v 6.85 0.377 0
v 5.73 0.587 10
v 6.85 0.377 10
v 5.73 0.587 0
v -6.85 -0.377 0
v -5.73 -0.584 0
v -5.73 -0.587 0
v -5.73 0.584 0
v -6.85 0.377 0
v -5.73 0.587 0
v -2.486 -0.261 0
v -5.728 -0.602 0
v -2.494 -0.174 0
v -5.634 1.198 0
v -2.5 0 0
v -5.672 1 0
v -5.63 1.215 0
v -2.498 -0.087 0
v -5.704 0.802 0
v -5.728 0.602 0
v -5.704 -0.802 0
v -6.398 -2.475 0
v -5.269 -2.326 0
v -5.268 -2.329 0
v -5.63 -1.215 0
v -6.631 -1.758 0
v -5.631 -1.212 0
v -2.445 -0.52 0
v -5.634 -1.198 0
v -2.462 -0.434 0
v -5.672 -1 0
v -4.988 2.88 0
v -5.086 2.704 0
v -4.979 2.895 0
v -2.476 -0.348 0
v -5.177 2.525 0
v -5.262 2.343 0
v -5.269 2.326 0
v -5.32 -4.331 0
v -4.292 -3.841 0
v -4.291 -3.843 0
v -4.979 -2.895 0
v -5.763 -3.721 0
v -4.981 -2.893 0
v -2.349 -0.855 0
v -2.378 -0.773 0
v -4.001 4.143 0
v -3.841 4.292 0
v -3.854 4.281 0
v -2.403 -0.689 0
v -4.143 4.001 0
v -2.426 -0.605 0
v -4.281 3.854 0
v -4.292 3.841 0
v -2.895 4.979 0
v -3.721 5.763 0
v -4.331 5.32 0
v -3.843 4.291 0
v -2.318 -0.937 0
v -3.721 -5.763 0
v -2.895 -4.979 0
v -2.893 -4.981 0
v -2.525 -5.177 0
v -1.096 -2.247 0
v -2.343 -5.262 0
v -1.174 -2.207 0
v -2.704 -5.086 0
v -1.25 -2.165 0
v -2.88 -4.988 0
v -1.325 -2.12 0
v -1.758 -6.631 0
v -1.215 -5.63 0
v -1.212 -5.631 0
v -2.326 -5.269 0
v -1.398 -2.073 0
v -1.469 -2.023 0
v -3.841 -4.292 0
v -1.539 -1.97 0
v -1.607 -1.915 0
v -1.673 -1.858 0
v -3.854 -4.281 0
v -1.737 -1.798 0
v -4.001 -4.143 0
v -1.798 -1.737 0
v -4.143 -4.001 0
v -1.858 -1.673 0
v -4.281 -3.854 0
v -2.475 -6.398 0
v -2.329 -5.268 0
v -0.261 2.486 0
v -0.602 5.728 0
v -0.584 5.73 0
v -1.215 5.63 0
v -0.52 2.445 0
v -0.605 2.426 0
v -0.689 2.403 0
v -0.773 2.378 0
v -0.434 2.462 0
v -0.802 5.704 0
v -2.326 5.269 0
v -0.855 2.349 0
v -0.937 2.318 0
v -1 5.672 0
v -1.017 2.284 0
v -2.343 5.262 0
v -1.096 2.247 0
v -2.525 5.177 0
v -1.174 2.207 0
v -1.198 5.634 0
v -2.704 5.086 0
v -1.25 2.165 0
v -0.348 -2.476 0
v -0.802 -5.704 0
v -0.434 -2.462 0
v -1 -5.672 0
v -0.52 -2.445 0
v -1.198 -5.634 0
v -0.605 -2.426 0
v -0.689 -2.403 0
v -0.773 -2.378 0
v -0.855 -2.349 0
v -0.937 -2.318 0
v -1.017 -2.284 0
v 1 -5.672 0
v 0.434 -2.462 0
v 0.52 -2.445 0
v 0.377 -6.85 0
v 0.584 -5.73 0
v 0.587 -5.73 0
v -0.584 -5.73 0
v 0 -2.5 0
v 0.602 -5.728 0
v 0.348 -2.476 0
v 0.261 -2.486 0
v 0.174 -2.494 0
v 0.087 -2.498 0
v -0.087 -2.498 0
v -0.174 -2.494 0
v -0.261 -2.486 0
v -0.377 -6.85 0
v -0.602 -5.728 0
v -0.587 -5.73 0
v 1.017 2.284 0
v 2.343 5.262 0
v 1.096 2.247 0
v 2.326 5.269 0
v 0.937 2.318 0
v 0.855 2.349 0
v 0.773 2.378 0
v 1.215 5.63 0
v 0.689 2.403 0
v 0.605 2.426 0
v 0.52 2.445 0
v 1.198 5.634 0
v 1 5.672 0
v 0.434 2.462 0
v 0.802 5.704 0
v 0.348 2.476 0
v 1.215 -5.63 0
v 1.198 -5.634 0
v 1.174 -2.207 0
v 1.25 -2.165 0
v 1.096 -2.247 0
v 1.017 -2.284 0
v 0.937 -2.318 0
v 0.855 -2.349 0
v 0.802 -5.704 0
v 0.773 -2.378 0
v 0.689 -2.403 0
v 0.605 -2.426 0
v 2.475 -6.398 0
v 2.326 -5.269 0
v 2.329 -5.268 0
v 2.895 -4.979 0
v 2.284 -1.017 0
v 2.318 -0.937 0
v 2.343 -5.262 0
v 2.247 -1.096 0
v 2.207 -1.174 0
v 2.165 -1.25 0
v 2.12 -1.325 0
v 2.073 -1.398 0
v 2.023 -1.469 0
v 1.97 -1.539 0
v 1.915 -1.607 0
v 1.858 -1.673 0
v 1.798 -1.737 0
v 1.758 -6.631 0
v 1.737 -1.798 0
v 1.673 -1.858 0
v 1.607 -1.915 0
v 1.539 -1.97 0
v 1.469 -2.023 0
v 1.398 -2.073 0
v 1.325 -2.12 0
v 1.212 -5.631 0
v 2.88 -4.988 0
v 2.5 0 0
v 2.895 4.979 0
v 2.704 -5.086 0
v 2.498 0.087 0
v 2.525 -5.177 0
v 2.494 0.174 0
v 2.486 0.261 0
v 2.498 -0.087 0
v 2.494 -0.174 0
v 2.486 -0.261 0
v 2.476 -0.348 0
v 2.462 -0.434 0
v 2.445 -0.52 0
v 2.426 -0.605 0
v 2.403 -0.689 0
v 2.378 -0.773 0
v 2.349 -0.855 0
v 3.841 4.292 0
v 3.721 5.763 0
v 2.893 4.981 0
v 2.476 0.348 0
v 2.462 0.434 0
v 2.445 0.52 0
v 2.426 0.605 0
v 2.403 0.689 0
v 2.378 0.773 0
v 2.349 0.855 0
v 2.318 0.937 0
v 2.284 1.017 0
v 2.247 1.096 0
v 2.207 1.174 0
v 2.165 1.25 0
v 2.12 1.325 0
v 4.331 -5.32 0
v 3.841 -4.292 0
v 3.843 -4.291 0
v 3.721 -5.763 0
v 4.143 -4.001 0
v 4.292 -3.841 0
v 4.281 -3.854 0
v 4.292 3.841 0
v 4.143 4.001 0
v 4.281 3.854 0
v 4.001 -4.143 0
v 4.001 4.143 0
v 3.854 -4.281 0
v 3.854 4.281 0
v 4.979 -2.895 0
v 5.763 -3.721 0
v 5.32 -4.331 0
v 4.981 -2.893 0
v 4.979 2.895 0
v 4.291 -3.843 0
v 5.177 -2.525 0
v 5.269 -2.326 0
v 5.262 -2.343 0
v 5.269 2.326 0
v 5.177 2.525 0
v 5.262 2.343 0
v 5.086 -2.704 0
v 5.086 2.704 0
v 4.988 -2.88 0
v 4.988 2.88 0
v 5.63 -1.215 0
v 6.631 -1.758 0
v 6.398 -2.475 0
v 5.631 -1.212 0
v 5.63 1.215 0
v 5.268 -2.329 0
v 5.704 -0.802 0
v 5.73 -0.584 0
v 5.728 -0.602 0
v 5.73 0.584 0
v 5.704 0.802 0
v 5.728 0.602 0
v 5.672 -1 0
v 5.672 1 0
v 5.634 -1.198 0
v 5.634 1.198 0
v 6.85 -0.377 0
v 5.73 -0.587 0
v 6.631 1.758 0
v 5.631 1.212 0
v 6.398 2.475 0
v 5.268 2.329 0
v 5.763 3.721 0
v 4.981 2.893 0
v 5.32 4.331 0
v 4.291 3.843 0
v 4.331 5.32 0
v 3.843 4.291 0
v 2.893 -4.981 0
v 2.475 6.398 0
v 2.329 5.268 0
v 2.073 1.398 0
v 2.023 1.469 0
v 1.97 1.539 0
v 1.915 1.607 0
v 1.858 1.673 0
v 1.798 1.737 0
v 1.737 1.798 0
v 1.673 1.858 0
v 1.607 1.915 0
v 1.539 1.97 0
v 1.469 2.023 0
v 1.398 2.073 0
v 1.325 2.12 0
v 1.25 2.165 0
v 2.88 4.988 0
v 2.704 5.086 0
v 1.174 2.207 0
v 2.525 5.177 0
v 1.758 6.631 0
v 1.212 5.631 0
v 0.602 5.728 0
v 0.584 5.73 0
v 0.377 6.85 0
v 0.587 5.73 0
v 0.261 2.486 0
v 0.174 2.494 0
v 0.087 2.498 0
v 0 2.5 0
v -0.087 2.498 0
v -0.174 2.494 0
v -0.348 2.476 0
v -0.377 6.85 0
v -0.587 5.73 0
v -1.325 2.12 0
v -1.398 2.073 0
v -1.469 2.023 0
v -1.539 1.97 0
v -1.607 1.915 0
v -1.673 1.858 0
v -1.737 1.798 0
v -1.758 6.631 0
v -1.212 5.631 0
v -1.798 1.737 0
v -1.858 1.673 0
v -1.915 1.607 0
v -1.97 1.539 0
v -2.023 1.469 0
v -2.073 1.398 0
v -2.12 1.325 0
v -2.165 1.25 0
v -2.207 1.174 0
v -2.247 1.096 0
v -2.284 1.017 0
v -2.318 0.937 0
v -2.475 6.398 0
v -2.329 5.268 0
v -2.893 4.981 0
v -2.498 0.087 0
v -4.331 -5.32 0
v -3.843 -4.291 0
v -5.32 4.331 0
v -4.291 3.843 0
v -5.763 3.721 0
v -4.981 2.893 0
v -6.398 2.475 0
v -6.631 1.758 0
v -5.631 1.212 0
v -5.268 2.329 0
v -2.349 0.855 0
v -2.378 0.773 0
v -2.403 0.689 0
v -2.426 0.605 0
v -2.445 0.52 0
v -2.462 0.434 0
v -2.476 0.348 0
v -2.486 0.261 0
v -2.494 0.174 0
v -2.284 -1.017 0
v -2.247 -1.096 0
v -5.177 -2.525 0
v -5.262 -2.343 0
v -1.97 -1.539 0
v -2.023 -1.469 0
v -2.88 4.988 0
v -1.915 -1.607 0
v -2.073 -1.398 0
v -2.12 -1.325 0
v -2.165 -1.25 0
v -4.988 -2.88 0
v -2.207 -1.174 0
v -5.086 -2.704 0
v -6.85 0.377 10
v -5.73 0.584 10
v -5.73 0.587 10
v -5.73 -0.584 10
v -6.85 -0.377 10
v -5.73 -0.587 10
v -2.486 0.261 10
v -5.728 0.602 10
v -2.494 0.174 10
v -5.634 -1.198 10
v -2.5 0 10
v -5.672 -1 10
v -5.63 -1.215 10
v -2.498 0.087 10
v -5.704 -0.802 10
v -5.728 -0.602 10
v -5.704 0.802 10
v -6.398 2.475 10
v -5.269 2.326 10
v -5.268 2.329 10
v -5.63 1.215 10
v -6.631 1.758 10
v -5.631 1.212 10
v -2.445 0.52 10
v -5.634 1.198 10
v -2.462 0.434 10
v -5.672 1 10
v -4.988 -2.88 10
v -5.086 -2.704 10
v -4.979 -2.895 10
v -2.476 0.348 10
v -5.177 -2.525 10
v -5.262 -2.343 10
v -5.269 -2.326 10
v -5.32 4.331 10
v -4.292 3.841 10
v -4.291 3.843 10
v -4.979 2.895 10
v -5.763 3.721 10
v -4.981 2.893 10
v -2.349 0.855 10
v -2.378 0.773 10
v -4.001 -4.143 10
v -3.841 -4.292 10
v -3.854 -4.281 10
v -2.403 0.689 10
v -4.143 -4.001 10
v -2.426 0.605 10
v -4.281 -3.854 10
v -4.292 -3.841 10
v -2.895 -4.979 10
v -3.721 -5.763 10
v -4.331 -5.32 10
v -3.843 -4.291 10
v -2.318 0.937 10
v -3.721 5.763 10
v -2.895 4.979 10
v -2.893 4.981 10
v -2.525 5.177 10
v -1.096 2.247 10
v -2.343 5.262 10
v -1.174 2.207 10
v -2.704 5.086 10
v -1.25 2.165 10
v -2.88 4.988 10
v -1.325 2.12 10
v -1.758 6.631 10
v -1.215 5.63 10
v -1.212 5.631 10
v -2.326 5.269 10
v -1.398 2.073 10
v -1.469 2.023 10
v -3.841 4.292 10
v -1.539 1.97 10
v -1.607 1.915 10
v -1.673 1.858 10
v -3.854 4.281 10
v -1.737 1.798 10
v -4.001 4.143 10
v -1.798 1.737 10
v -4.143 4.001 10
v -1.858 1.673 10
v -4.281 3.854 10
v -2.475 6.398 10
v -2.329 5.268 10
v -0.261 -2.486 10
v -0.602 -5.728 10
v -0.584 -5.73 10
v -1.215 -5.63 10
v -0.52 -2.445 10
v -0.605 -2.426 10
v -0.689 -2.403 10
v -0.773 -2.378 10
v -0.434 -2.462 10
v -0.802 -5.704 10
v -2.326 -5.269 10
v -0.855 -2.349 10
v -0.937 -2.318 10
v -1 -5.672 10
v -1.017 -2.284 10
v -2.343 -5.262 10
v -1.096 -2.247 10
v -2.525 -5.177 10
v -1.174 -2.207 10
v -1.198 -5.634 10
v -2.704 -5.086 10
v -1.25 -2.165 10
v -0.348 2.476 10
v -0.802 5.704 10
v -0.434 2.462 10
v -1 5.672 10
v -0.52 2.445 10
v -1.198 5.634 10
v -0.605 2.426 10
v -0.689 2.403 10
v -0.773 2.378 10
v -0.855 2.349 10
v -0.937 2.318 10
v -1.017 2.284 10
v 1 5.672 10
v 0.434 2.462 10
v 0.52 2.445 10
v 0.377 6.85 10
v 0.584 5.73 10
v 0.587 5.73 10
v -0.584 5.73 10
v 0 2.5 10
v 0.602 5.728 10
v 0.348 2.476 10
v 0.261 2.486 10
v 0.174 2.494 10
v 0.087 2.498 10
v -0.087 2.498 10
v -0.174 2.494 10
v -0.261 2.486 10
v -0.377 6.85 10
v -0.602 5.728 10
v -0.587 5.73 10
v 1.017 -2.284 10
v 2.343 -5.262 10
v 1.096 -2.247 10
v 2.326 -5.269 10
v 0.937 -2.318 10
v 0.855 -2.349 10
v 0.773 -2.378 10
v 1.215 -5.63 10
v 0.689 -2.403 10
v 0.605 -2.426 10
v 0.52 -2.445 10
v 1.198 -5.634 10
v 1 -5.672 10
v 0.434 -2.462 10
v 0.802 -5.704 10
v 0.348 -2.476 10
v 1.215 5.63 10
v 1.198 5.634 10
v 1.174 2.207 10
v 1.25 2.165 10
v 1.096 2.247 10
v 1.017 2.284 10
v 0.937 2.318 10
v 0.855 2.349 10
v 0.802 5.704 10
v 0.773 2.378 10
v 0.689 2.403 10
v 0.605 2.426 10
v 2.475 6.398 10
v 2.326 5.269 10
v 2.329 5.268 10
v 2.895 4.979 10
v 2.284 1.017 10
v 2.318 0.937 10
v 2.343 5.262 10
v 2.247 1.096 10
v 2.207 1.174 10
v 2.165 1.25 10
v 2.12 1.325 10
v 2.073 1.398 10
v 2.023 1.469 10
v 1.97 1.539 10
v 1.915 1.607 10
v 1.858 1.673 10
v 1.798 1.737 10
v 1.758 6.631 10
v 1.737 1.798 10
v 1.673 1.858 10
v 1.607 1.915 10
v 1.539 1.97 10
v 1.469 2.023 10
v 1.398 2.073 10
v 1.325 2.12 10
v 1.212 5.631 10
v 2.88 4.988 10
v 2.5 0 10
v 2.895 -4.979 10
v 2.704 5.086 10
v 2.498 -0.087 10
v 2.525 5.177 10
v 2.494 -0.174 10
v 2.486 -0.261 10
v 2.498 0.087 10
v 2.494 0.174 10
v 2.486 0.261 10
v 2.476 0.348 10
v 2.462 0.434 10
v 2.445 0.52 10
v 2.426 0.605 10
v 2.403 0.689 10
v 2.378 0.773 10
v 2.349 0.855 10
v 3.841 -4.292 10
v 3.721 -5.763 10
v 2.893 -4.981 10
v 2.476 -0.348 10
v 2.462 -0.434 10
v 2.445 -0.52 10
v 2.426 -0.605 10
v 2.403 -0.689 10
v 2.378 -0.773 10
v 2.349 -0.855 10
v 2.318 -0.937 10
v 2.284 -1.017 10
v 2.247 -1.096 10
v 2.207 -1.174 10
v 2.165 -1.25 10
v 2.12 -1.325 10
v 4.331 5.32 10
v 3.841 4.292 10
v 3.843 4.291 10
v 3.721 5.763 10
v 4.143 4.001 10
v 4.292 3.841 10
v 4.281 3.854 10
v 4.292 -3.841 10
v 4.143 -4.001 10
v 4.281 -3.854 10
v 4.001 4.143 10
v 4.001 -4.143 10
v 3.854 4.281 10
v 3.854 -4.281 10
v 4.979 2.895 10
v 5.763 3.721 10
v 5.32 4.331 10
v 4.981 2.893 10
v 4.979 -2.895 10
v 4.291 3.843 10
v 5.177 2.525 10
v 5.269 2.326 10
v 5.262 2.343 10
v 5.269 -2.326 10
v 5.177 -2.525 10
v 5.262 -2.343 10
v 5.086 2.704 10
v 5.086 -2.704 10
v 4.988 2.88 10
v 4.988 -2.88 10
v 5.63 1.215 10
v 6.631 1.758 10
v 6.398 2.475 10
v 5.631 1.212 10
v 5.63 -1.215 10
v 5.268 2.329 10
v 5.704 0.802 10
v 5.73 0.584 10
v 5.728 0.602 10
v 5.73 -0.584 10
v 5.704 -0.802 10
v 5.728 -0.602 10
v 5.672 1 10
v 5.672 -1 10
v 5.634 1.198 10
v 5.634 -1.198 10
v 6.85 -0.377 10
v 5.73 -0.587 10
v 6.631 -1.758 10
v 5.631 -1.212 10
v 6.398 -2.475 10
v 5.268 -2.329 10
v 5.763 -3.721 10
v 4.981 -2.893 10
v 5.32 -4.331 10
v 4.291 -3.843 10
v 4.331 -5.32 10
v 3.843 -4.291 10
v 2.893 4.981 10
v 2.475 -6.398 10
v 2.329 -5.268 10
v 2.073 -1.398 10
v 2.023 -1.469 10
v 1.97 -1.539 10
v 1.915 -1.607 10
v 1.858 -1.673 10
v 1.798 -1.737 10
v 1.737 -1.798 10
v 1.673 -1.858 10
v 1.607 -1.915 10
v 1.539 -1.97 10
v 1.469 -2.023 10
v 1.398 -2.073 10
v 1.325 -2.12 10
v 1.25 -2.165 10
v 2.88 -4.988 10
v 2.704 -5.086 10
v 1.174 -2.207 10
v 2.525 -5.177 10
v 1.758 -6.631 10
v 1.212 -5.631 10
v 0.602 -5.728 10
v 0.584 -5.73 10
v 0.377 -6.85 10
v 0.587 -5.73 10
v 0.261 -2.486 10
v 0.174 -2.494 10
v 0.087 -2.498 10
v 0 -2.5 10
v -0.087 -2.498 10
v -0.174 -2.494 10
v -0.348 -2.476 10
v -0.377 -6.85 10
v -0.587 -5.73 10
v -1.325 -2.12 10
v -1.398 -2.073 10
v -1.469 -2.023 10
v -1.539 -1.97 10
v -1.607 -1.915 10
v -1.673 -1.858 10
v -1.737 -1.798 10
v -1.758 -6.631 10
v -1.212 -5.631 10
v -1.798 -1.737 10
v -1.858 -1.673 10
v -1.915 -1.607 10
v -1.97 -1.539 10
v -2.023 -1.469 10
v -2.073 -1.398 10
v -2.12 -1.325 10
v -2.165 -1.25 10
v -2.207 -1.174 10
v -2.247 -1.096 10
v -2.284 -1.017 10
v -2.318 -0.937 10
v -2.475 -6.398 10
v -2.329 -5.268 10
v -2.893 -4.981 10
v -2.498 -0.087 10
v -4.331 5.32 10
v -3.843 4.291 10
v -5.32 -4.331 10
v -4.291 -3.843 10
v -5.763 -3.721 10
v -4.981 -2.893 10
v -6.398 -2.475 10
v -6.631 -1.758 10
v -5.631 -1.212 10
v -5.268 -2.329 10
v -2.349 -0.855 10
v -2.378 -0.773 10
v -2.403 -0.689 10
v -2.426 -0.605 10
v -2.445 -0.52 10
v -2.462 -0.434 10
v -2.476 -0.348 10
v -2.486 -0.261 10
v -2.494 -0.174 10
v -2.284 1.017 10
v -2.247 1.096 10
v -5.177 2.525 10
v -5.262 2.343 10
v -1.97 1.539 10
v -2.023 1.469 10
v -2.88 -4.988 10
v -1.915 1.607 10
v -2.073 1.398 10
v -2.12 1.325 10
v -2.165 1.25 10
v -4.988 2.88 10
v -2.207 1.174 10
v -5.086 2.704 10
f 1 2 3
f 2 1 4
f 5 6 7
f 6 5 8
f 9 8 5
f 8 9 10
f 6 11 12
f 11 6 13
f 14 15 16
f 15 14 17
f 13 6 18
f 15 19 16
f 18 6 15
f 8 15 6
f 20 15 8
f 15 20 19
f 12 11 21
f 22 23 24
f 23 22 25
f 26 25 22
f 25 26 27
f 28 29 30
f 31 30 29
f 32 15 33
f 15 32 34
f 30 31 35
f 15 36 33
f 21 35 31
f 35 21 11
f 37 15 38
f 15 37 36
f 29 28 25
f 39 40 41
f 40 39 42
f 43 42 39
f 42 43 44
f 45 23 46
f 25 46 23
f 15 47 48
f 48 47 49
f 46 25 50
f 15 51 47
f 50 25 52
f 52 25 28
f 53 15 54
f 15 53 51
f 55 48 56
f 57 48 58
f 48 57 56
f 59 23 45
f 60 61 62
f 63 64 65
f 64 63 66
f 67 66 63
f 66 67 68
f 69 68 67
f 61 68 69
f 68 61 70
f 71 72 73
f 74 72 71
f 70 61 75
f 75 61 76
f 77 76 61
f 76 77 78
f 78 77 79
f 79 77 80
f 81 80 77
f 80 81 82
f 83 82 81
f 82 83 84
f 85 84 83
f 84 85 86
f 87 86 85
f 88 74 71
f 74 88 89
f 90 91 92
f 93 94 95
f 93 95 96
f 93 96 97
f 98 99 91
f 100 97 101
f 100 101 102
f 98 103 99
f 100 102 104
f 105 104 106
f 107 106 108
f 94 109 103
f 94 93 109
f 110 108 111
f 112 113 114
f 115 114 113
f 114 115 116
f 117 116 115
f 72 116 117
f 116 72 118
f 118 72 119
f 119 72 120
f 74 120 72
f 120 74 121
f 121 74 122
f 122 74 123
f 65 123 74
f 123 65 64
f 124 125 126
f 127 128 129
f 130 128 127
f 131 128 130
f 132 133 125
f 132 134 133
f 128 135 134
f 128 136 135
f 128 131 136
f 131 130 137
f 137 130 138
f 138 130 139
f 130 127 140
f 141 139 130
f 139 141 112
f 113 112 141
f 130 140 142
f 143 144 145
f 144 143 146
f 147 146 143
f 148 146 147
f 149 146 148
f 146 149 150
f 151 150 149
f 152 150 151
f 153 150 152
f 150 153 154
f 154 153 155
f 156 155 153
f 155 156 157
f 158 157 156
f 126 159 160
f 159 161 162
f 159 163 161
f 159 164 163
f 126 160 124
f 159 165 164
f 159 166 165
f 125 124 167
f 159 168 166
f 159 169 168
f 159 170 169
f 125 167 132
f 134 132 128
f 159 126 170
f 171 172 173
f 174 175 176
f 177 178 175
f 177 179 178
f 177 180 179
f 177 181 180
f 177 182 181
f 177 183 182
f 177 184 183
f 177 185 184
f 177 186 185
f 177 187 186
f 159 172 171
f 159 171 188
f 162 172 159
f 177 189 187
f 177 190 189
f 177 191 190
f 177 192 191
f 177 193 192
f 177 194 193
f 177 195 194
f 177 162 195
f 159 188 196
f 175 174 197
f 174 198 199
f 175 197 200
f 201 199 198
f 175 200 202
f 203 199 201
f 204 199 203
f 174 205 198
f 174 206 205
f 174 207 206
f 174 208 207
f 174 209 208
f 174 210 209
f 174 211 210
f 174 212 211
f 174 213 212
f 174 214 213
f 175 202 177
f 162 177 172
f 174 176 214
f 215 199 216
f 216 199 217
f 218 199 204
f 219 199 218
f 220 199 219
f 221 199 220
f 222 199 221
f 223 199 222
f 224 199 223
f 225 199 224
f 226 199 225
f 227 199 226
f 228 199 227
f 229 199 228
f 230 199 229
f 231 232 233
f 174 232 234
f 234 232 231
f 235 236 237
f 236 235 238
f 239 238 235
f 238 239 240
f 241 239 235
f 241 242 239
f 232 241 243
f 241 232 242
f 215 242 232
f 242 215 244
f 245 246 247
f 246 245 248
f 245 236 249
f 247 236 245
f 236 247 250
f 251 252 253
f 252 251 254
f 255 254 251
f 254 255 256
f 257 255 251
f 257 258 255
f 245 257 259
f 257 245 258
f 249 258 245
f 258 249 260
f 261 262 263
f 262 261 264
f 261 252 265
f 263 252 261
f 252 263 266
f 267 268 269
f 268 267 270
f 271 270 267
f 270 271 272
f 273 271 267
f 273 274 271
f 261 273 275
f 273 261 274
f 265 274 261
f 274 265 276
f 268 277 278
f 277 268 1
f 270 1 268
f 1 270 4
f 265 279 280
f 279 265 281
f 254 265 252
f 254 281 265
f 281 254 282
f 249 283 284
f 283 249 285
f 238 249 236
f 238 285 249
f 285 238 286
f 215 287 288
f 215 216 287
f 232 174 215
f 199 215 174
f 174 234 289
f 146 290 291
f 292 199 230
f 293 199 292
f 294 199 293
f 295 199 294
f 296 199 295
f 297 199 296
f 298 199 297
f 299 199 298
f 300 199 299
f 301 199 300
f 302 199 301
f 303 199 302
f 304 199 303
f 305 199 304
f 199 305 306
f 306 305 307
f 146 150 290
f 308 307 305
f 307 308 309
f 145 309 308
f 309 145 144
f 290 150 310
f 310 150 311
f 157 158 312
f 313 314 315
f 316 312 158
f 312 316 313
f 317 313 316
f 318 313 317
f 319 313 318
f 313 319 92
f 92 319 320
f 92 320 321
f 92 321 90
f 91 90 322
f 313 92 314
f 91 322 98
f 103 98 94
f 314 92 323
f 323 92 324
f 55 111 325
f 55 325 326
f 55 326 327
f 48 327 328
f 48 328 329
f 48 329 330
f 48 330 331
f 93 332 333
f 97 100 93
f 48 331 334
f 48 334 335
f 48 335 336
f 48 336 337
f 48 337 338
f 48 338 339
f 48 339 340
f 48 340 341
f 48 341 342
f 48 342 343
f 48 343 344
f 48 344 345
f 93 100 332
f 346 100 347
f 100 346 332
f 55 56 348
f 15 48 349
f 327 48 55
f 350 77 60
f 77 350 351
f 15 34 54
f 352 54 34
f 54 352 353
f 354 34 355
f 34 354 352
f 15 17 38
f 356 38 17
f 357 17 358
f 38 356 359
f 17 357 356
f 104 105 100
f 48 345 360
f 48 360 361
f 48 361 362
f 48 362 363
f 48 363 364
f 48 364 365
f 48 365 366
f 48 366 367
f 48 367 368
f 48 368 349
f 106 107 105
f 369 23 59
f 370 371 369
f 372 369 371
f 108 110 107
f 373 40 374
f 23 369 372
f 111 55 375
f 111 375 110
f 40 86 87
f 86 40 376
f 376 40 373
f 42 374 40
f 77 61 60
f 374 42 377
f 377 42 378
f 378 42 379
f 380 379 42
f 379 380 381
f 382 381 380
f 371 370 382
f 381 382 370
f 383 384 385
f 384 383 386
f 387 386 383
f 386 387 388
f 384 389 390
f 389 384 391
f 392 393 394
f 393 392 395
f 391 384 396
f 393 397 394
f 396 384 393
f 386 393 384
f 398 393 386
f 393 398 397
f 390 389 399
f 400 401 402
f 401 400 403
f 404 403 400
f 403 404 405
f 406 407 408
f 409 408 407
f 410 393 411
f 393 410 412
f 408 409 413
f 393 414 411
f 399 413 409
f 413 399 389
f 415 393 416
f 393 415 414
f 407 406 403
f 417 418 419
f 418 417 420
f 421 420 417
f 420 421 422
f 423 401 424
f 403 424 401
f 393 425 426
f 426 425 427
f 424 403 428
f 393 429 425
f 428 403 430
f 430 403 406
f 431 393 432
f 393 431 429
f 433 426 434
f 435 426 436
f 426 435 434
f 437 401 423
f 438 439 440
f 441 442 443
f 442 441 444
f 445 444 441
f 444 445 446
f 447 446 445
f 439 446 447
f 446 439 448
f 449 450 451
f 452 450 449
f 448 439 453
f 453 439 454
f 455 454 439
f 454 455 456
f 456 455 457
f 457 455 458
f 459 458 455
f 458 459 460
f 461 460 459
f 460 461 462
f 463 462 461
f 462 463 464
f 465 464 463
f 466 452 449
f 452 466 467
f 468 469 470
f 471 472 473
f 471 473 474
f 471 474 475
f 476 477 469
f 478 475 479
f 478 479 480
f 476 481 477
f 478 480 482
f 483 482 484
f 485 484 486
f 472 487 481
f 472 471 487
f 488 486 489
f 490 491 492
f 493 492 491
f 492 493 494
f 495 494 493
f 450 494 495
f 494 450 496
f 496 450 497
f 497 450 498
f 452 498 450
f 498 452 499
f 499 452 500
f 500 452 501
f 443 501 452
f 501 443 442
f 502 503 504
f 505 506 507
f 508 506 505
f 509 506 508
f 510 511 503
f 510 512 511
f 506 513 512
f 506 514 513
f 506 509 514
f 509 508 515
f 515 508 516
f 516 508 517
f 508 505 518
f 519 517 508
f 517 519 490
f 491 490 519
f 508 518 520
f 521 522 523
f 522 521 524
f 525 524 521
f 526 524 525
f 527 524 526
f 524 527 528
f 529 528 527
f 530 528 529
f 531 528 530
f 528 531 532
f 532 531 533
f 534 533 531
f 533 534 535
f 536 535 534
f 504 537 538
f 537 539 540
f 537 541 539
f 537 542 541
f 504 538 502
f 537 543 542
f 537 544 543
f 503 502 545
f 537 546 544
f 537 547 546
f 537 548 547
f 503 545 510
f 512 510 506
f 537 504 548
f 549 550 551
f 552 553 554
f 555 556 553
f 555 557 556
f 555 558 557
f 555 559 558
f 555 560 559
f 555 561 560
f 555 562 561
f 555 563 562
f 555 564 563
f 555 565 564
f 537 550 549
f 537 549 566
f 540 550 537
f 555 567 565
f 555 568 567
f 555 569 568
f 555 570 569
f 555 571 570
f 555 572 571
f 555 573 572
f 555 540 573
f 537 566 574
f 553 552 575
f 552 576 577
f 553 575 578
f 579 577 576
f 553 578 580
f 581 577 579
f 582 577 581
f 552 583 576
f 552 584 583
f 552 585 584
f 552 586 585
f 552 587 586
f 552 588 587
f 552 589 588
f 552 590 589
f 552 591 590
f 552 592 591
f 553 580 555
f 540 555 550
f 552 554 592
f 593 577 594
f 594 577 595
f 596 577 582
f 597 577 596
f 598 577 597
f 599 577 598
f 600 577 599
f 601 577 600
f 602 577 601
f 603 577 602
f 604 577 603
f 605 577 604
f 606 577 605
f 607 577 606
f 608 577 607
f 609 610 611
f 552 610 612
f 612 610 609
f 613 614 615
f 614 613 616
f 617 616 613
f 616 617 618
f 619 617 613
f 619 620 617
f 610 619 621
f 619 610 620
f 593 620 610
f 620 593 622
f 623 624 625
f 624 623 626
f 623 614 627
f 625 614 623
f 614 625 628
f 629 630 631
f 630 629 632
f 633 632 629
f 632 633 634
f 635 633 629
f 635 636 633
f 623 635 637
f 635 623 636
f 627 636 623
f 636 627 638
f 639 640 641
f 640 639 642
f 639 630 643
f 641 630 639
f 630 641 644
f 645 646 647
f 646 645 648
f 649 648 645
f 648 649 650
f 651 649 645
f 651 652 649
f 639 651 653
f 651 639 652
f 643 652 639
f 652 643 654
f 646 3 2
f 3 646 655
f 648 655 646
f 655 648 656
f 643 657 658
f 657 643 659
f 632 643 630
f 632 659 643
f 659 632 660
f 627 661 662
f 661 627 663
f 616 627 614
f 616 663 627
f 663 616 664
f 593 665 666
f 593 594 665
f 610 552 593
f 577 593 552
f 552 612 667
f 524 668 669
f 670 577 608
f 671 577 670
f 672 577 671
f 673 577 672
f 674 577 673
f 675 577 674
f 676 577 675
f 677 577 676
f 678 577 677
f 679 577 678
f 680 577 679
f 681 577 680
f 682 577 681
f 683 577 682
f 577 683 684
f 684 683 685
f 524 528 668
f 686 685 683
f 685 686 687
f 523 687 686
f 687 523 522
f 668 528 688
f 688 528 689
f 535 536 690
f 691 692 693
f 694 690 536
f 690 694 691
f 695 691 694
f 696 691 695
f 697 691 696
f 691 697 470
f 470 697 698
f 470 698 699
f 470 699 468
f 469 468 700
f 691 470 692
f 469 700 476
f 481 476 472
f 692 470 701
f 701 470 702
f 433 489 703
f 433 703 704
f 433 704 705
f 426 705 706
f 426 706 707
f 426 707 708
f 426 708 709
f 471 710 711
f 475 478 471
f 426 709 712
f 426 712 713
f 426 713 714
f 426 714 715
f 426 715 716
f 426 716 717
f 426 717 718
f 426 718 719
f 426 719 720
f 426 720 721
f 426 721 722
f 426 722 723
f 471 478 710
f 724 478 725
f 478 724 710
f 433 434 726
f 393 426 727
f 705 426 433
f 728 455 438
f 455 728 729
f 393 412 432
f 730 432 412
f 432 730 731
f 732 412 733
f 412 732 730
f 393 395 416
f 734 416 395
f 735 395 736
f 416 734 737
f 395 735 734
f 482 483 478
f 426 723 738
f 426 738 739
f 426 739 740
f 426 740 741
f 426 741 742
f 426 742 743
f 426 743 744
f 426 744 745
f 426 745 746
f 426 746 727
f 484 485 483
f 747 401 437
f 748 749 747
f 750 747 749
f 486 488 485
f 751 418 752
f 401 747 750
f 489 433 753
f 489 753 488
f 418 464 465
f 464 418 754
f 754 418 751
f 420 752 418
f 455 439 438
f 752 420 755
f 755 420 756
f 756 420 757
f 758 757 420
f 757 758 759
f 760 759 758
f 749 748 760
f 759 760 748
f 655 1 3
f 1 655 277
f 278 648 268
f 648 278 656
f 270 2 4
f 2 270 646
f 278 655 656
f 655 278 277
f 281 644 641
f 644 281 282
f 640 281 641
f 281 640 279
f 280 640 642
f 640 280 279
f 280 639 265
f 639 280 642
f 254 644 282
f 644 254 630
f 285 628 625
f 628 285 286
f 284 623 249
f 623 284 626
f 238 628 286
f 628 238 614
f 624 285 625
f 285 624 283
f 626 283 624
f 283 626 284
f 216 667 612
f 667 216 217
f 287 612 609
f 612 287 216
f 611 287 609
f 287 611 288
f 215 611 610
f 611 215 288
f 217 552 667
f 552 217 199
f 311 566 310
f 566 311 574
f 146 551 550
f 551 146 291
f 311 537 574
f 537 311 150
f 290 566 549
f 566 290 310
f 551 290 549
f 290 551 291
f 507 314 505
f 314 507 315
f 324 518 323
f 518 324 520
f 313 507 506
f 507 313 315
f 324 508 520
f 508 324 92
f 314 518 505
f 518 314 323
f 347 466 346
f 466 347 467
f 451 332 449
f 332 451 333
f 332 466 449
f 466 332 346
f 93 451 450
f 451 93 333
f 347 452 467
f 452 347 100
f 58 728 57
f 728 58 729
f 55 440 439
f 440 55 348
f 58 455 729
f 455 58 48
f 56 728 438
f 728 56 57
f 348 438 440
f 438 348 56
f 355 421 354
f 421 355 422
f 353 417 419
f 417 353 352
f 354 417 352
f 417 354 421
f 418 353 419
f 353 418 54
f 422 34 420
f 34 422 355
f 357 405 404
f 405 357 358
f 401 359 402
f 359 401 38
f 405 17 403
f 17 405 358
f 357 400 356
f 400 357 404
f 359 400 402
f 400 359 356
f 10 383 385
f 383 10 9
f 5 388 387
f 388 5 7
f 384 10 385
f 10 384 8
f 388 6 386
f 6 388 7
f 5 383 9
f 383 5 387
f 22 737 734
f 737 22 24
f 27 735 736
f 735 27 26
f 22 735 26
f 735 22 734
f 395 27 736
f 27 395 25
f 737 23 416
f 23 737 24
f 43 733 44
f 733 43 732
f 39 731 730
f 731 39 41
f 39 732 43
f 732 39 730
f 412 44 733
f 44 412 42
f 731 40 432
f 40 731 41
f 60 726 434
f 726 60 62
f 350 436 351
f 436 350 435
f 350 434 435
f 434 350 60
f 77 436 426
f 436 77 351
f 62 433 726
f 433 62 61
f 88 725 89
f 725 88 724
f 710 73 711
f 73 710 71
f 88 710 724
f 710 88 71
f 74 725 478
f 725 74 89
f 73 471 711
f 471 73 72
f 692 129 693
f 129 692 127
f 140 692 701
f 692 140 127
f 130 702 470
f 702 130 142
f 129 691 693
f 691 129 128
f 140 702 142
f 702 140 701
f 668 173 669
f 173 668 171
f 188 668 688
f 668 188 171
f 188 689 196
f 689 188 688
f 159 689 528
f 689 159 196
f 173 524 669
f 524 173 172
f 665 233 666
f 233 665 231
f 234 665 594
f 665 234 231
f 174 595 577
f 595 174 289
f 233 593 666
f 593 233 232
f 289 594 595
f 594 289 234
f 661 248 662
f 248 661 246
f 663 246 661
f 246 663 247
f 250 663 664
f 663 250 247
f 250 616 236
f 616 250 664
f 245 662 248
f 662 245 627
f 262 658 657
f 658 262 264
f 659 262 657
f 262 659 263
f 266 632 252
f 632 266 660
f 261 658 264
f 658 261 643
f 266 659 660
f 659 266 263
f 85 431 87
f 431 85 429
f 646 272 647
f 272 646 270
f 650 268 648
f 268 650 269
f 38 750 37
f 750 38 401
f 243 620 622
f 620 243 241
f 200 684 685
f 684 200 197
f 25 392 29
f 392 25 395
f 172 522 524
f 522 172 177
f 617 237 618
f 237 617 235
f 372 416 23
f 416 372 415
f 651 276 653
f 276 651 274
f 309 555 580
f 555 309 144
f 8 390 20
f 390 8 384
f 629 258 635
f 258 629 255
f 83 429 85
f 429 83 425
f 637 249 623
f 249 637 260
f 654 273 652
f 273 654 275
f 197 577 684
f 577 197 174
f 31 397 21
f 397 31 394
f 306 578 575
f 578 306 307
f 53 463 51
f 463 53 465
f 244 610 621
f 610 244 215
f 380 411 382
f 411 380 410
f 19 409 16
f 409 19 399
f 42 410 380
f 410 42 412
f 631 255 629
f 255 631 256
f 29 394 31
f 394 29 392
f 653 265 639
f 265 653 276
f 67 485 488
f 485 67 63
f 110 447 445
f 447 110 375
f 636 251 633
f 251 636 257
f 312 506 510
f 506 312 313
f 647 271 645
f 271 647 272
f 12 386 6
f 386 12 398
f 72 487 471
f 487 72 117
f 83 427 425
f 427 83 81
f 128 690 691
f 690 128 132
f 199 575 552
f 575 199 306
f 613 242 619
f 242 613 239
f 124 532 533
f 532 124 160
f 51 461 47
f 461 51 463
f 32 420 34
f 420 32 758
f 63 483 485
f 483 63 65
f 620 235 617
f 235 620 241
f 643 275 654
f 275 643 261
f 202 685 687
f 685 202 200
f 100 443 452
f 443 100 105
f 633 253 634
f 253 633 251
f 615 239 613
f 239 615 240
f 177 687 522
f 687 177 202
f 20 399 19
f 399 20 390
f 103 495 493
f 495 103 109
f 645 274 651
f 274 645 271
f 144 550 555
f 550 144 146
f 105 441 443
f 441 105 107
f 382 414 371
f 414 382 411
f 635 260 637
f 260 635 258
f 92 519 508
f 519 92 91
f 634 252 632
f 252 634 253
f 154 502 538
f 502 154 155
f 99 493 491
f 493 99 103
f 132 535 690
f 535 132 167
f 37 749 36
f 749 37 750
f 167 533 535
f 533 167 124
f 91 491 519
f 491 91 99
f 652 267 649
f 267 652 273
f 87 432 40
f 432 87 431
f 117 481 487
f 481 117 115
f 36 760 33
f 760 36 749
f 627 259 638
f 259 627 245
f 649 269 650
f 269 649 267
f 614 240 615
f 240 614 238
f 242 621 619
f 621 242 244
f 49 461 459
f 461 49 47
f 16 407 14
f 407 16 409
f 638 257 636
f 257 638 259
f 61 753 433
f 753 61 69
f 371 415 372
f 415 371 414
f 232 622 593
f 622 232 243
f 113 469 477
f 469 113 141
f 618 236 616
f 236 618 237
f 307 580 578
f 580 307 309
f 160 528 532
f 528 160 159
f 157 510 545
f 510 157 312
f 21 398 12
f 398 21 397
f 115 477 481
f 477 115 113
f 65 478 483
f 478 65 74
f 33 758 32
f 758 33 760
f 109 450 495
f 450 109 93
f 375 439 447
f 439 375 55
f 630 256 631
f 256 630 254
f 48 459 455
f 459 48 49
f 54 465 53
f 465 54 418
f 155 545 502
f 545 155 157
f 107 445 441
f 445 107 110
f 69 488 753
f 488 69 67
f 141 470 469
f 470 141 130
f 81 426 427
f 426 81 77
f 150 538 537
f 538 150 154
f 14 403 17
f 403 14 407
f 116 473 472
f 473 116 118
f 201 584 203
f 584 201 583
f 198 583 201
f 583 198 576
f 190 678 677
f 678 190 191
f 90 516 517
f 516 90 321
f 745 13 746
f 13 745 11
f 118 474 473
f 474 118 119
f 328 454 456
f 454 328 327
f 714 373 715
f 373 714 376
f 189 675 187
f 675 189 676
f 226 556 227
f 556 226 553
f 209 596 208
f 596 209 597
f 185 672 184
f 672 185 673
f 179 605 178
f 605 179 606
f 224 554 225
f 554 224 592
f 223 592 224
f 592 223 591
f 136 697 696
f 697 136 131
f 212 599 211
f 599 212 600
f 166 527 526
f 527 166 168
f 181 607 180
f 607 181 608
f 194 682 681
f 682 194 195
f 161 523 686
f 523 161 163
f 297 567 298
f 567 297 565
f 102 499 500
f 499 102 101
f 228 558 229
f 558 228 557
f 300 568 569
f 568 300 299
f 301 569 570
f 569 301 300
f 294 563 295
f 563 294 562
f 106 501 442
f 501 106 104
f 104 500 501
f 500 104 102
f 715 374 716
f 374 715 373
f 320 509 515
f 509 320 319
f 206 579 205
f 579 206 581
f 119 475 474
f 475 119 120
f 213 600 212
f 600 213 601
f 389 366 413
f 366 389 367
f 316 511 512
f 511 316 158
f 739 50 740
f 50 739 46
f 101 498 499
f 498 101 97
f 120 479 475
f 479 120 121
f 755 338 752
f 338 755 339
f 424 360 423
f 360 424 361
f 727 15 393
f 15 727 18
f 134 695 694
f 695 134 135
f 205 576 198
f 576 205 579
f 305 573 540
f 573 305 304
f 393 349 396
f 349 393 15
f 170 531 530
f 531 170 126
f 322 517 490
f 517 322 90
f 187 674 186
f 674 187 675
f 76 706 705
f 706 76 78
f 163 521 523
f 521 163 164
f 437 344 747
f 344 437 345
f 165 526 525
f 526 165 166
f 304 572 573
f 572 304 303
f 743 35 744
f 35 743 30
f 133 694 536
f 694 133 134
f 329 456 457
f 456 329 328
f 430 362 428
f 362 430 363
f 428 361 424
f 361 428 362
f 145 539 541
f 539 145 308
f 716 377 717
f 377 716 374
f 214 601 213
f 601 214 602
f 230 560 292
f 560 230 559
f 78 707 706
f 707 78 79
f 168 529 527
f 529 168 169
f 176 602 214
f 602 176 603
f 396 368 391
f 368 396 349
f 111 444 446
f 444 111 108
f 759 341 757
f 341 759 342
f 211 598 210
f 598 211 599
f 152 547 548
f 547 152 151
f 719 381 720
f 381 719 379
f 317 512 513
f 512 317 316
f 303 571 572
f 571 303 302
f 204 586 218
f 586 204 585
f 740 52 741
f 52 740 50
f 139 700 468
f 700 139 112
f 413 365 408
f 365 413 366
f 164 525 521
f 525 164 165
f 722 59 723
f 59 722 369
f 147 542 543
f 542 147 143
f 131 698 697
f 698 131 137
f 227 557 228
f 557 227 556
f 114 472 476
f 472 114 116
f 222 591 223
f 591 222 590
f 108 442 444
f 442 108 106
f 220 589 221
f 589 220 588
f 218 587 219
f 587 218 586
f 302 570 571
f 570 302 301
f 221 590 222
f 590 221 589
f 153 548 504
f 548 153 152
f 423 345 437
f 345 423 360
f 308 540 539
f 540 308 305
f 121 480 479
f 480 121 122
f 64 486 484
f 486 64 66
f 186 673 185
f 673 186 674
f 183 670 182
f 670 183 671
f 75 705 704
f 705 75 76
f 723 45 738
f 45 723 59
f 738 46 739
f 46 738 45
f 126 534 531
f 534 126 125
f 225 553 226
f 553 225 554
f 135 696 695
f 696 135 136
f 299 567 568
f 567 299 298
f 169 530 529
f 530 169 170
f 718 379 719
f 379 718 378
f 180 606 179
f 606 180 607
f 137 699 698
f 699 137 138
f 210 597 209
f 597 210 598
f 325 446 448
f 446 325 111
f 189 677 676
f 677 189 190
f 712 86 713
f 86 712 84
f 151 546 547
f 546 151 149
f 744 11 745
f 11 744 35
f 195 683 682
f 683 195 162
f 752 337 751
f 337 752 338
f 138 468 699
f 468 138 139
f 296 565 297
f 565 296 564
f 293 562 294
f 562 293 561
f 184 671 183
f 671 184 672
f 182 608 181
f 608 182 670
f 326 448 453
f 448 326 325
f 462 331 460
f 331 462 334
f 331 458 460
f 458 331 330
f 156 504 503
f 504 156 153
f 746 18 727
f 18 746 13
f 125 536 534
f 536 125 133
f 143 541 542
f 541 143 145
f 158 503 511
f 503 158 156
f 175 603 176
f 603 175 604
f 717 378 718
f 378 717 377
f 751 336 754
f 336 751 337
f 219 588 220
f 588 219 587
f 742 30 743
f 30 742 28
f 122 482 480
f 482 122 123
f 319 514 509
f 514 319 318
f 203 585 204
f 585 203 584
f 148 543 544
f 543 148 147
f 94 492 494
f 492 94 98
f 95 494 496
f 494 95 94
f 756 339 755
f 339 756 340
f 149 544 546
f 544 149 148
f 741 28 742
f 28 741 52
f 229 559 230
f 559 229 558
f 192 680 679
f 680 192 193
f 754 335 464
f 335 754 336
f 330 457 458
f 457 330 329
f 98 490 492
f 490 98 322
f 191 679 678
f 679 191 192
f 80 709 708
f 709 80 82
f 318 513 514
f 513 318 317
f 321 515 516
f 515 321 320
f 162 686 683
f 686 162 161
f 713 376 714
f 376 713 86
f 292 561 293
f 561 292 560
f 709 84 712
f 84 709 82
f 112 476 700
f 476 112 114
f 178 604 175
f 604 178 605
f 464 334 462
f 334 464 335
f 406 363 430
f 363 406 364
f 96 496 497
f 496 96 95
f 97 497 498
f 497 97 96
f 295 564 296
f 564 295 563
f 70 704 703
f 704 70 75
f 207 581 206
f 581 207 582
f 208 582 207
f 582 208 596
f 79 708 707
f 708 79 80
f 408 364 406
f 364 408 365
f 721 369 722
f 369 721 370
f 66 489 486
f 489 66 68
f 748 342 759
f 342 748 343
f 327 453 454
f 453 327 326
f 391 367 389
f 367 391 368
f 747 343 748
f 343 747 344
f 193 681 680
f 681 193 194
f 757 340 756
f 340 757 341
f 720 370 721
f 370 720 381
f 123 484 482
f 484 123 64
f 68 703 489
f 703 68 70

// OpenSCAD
$fn = 180;

// Timing pulley (simplified GT2-like tooth form)
// User specs:
teeth = 20;
pitch_d = 12.22;          // mm pitch diameter
pitch_r = pitch_d/2;

// Assumptions / typical defaults (editable):
belt_pitch = PI * pitch_d / teeth;   // derived from pitch diameter & tooth count
pulley_width = 10;                   // mm
bore_d = 5;                          // mm
hub_d = 0;                           // 0 = no hub
hub_h = 0;                           // mm

// Tooth geometry (simplified trapezoid, sized relative to pitch)
tooth_height = 0.75;                 // mm radial height above pitch circle
tooth_root_depth = 0.35;             // mm radial depth below pitch circle (for valleys)
tooth_top_frac = 0.35;               // fraction of pitch for tooth top width
tooth_base_frac = 0.65;              // fraction of pitch for tooth base width

// Derived radii
outer_r = pitch_r + tooth_height;
root_r  = pitch_r - tooth_root_depth;

// Safety
root_r_safe = max(root_r, bore_d/2 + 0.8);

// Tooth angular widths
tooth_top_w  = belt_pitch * tooth_top_frac;
tooth_base_w = belt_pitch * tooth_base_frac;

tooth_top_ang  = tooth_top_w  / pitch_r * 180/PI;
tooth_base_ang = tooth_base_w / pitch_r * 180/PI;

module tooth2d() {
    // Trapezoid centered on +X axis, spanning angles around 0
    polygon(points=[
        [root_r_safe*cos(-tooth_base_ang/2), root_r_safe*sin(-tooth_base_ang/2)],
        [outer_r*cos(-tooth_top_ang/2),      outer_r*sin(-tooth_top_ang/2)],
        [outer_r*cos( tooth_top_ang/2),      outer_r*sin( tooth_top_ang/2)],
        [root_r_safe*cos( tooth_base_ang/2), root_r_safe*sin( tooth_base_ang/2)]
    ]);
}

module pulley_body() {
    // Base cylinder up to root radius
    cylinder(h=pulley_width, r=root_r_safe, center=false);

    // Teeth ring
    for(i=[0:teeth-1]) {
        rotate([0,0, i*360/teeth])
            linear_extrude(height=pulley_width)
                tooth2d();
    }

    // Optional hub
    if(hub_d > 0 && hub_h > 0) {
        translate([0,0,(pulley_width-hub_h)/2])
            cylinder(h=hub_h, r=hub_d/2, center=false);
    }
}

difference() {
    pulley_body();
    // Bore
    translate([0,0,-1])
        cylinder(h=pulley_width+2, r=bore_d/2, center=false);
}
